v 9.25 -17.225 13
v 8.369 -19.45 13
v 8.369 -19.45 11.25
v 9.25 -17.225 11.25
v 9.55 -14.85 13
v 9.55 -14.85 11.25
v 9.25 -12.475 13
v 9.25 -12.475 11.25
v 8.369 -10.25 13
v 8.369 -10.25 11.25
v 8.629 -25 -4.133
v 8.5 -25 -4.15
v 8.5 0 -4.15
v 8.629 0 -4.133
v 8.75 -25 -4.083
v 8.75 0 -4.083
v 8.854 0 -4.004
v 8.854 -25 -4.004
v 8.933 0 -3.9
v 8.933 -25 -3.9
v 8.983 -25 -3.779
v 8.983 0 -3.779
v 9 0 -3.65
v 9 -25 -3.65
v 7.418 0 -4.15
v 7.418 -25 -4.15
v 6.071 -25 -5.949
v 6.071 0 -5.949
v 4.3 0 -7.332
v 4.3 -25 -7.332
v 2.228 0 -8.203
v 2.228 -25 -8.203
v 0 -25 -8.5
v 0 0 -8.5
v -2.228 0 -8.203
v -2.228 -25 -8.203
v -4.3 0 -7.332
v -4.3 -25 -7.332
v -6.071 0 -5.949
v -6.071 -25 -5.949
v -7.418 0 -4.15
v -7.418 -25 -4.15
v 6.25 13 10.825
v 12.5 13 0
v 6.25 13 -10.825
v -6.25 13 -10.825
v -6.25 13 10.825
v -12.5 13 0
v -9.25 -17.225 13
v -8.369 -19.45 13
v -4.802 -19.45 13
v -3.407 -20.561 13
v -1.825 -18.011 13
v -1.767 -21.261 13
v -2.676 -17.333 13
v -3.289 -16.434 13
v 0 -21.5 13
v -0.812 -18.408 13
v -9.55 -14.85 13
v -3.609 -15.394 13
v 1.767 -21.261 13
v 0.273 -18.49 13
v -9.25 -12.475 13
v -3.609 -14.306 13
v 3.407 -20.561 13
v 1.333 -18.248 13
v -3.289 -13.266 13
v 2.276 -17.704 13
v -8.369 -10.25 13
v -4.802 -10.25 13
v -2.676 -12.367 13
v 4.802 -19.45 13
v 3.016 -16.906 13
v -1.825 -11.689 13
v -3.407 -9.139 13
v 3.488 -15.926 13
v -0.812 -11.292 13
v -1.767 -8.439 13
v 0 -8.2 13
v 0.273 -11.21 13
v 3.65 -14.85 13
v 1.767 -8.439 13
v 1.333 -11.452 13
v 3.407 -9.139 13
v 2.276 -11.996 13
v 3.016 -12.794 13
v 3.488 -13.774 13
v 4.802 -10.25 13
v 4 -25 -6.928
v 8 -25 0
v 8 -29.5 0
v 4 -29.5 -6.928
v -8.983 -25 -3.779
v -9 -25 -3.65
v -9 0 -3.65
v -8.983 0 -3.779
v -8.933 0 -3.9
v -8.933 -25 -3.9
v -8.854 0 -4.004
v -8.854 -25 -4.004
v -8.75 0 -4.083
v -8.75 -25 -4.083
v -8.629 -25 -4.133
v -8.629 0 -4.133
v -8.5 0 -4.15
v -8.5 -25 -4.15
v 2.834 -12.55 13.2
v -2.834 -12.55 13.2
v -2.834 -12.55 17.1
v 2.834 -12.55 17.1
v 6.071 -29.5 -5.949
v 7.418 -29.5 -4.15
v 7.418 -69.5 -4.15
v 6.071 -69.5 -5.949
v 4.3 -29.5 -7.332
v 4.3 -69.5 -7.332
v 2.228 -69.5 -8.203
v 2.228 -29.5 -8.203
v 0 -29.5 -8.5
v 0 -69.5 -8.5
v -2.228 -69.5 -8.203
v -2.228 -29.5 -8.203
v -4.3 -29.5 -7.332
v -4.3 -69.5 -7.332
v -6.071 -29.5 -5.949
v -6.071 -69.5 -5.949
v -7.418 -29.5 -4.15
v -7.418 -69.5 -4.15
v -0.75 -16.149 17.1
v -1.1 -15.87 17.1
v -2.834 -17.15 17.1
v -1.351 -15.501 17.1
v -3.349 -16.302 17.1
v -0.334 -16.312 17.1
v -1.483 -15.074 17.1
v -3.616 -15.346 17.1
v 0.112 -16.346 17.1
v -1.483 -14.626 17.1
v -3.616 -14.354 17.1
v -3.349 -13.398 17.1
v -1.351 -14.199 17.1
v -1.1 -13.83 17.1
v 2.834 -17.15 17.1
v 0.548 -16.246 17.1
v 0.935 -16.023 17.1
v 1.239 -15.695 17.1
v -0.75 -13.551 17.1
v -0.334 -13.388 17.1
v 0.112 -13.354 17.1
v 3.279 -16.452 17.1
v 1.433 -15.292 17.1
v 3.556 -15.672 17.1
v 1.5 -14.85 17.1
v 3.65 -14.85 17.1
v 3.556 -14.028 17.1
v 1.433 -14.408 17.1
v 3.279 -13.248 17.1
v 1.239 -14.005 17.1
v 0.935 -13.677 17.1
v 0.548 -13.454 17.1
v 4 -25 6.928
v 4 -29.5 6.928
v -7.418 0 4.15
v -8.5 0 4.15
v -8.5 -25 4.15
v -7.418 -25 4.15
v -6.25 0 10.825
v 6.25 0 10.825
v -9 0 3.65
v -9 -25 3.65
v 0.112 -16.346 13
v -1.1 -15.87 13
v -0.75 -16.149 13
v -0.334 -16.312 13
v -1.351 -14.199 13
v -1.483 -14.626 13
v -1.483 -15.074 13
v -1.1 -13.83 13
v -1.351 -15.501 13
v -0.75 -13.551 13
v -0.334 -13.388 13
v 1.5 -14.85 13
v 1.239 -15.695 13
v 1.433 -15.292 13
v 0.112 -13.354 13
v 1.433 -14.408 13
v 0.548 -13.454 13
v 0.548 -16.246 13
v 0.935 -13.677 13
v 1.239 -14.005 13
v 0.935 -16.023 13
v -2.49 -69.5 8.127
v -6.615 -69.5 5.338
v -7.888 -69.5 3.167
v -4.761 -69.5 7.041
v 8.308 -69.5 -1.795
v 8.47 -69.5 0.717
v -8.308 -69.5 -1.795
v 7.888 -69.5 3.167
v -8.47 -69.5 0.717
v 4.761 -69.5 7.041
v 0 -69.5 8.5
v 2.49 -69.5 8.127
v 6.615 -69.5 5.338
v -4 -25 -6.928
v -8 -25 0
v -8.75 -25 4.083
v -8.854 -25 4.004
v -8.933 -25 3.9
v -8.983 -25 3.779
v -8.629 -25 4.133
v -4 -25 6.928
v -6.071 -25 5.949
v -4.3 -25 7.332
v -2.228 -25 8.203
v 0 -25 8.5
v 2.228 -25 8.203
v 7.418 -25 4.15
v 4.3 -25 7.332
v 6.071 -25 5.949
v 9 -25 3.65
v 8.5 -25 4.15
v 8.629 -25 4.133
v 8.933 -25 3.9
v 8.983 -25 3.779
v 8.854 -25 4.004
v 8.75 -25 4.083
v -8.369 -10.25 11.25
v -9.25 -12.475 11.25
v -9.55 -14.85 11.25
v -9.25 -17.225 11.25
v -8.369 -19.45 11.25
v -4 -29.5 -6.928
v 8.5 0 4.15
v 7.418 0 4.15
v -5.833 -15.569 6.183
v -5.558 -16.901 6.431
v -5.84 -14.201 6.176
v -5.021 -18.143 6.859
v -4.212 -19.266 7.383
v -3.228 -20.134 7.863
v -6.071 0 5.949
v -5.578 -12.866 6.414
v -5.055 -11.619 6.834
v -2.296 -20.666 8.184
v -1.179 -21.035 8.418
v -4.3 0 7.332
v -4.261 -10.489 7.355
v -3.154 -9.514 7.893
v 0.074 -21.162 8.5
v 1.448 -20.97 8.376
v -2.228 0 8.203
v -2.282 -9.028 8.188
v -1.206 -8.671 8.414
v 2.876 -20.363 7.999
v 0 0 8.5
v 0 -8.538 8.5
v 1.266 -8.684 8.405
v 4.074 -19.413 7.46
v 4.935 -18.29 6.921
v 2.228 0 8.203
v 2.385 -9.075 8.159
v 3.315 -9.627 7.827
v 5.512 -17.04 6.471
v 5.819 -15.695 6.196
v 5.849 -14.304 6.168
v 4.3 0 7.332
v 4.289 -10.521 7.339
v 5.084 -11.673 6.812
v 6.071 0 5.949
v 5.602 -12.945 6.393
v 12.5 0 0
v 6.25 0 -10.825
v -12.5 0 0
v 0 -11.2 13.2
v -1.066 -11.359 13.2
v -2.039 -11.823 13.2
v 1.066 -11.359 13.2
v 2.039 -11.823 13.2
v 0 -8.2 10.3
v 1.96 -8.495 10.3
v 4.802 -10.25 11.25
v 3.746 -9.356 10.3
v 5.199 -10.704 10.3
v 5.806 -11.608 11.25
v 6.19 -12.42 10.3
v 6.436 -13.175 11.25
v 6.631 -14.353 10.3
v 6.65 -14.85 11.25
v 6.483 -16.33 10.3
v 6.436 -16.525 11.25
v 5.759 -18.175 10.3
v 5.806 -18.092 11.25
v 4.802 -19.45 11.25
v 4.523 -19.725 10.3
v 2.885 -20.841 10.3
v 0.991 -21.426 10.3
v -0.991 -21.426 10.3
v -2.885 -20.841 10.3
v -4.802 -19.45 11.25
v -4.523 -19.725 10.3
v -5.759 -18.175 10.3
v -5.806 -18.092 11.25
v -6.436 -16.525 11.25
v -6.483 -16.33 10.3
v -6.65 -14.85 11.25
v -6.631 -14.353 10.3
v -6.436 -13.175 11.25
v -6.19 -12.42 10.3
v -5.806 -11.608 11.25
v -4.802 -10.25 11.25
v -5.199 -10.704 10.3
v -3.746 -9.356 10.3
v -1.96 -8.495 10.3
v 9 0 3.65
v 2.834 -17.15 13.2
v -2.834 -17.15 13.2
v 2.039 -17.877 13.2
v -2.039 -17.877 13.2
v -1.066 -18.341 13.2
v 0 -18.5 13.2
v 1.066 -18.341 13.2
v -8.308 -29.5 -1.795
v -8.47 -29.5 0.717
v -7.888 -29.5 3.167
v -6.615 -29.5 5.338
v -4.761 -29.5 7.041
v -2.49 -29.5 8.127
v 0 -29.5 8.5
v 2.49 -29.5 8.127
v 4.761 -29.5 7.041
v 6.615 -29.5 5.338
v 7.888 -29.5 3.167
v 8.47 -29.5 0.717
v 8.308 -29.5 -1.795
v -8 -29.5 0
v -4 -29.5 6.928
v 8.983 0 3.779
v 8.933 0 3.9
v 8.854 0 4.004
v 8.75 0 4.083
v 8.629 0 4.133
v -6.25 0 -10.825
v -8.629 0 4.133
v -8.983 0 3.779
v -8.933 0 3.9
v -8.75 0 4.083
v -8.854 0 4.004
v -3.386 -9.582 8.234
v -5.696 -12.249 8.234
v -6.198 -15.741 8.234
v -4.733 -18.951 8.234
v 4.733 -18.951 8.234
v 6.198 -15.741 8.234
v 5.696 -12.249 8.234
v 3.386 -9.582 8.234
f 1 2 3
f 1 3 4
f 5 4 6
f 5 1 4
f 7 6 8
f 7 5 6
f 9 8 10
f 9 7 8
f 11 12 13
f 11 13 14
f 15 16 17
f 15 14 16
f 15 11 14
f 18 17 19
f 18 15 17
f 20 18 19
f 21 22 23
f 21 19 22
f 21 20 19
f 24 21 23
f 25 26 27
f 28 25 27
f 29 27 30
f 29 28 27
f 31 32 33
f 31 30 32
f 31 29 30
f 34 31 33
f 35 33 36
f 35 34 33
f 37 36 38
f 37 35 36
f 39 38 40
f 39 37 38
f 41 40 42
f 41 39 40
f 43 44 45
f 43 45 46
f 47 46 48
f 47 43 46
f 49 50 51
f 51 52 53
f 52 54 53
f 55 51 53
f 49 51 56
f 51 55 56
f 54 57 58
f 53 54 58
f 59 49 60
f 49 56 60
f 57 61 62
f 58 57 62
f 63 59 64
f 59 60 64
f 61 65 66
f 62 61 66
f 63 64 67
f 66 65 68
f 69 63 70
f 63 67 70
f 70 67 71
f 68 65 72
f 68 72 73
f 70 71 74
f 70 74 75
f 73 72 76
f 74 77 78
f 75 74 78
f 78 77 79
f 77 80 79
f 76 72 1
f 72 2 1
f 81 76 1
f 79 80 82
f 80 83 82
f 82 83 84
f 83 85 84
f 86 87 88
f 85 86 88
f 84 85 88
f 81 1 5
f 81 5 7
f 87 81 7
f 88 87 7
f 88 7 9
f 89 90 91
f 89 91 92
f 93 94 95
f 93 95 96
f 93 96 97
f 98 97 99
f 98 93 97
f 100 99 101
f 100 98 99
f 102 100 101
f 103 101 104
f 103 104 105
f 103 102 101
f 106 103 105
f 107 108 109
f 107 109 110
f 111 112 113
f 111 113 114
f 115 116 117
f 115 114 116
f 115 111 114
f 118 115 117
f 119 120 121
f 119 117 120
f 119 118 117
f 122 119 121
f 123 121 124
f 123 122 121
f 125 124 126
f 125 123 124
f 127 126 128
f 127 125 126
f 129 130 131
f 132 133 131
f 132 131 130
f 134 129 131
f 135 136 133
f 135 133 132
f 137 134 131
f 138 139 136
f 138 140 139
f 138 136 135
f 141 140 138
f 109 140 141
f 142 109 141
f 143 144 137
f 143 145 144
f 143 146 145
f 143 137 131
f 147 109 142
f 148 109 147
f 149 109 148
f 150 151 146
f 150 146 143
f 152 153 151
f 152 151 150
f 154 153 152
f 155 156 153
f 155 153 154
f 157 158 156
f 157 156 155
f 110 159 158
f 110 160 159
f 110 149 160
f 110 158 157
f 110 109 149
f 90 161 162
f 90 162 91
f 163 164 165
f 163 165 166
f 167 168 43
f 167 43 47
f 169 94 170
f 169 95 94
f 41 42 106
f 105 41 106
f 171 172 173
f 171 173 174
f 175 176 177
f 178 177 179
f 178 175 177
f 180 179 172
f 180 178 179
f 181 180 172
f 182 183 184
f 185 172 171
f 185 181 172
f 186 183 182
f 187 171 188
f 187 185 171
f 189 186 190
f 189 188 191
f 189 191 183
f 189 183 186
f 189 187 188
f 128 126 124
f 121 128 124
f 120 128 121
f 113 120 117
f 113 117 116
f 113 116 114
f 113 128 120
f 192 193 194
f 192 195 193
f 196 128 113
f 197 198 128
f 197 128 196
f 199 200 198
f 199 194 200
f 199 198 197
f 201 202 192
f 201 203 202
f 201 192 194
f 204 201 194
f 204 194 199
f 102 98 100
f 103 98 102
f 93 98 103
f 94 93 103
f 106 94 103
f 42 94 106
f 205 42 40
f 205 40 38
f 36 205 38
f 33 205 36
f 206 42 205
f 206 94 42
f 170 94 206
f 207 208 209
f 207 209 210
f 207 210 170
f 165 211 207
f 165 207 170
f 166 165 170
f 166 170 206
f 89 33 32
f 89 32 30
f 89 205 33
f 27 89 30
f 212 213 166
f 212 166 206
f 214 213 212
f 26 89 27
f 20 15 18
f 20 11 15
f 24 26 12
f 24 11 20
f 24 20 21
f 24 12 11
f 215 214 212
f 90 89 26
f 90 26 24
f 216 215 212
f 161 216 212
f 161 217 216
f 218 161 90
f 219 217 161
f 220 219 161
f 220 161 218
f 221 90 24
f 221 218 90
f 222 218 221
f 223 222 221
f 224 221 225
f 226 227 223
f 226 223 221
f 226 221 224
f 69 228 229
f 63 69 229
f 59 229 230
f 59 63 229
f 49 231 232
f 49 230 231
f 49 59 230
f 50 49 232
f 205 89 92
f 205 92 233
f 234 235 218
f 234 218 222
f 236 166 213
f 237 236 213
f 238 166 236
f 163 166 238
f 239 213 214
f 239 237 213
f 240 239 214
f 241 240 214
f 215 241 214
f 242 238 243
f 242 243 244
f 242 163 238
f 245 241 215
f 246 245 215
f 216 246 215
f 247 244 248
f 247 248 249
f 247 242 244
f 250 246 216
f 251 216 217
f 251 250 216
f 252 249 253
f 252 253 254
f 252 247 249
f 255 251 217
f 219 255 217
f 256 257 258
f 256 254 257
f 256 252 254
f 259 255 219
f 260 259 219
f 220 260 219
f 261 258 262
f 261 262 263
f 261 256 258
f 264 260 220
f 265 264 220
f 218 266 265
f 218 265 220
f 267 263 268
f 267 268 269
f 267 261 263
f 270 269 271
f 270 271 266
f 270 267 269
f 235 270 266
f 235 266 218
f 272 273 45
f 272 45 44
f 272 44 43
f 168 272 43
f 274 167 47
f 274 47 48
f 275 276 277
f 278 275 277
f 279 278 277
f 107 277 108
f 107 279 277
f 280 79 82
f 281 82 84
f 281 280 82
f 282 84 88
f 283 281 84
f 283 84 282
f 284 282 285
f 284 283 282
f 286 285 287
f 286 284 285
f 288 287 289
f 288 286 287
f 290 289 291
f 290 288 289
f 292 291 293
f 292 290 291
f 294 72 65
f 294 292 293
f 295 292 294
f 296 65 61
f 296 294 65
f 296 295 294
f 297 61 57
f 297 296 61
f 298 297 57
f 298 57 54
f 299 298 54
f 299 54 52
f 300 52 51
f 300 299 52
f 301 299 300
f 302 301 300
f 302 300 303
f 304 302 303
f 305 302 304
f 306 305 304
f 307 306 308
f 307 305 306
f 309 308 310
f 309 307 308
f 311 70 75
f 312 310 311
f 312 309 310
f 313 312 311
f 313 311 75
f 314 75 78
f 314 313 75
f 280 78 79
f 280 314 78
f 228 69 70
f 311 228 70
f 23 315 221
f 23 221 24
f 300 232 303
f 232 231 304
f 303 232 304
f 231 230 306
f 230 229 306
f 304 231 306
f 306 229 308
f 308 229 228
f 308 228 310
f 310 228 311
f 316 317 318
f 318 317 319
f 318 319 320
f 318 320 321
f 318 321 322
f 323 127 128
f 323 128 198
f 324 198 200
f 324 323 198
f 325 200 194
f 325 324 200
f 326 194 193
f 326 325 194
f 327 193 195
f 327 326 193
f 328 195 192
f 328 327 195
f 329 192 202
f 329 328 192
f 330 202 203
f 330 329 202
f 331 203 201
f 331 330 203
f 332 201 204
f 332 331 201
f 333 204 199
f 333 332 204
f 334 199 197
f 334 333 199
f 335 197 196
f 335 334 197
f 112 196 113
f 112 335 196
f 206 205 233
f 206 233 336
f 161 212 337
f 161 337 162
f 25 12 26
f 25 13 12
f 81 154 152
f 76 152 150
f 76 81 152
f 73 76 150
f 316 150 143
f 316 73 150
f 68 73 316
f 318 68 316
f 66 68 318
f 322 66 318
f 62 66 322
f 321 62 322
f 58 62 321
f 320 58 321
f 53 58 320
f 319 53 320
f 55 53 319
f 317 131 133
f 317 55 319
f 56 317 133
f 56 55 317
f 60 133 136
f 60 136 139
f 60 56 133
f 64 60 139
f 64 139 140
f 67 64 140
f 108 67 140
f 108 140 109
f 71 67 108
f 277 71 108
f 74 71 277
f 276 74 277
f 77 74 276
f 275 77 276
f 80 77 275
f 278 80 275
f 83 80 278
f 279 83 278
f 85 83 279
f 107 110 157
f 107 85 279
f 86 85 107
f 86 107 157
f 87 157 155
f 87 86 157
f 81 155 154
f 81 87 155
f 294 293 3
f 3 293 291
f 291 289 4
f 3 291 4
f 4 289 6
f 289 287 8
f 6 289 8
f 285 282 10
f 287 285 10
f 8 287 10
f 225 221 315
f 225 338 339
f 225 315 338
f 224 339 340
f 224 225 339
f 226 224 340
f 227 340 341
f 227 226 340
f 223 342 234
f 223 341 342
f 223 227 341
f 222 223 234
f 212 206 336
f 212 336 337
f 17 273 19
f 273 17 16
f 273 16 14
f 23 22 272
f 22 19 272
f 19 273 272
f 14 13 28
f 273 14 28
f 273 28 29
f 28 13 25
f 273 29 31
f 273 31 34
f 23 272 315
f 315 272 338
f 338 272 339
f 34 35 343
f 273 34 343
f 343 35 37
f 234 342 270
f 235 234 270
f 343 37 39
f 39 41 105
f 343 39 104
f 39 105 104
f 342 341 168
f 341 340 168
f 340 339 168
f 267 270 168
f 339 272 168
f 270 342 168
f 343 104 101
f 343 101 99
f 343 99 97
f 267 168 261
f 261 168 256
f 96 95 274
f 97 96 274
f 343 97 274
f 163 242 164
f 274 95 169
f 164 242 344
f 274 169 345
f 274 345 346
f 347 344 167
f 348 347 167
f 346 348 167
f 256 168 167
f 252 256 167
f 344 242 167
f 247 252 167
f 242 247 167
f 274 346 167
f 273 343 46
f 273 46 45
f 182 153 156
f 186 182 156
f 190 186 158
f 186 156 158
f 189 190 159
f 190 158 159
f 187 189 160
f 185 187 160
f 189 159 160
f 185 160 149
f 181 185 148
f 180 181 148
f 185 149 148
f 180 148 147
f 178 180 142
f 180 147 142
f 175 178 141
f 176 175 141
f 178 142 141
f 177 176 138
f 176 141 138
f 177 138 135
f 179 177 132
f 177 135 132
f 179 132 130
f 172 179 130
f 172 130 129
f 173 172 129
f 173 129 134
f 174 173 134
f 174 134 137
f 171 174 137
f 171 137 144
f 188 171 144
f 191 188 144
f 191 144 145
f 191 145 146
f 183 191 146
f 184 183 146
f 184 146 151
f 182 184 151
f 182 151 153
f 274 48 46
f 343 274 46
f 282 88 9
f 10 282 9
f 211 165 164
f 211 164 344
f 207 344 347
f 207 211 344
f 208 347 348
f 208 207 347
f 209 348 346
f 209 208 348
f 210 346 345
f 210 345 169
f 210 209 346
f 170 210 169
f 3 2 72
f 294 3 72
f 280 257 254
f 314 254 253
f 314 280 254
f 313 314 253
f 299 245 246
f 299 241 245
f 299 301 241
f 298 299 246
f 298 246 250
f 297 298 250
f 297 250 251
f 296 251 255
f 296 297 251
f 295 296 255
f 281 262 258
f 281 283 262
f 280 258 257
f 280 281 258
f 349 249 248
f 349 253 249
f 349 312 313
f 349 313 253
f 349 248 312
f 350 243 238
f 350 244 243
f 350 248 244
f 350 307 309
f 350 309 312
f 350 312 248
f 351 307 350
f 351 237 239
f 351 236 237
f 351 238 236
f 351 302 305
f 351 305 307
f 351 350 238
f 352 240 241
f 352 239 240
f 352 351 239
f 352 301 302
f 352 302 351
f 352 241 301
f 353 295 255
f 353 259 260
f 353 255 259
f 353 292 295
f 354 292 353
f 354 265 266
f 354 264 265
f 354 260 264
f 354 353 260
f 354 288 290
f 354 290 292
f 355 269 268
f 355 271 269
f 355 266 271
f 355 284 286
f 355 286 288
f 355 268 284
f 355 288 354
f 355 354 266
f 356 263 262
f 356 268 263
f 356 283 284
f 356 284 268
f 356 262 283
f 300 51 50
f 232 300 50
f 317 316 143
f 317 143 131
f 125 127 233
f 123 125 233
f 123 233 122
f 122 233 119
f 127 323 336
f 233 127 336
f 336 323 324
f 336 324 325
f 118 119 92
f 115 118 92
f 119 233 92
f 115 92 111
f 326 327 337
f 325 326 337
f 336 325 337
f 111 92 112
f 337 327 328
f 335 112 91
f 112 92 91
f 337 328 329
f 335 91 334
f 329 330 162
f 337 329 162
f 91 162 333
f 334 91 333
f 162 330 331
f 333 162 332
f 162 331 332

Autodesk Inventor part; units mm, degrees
ref_plane "YZ Plane" through (0, 0, 0) normal (1, 0, 0) x (0, 1, 0)
ref_plane "XZ Plane" through (0, 0, 0) normal (0, 1, 0) x (-1, 0, 0)
ref_plane "XY Plane" through (0, 0, 0) normal (0, 0, 1) x (1, 0, 0)
sketch "스케치1" plane through (0, 0, 0) normal (0, 1, 0) x (-1, 0, 0)
  line L0 (12.5, 0) -> (6.25, -10.8253)
  line L1 (6.25, -10.8253) -> (-6.25, -10.8253)
  line L2 (-6.25, -10.8253) -> (-12.5, 0)
  line L3 (-12.5, 0) -> (-6.25, 10.8253)
  line L4 (-6.25, 10.8253) -> (6.25, 10.8253)
  line L5 (6.25, 10.8253) -> (12.5, 0)
  point P0 (0, 0)
  point P1 (0, 0)
  dimension "d0" = 25
extrude "돌출1" add sketch "스케치1" along normal blind 13
sketch "스케치2" plane through (0, 0, 0) normal (0, -1, 0) x (1, 0, 0)
  circle A0 centre (0, 0) radius 8.5
  line L0 (-9, 4.15) -> (9, 4.15)
  line L1 (9, 4.15) -> (9, -4.15)
  line L2 (9, -4.15) -> (-9, -4.15)
  line L3 (-9, -4.15) -> (-9, 4.15)
  line L4 (-9, 4.15) -> (9, -4.15) construction
  line L5 (9, 4.15) -> (-9, -4.15) construction
  point P0 (7.4181, -4.15)
  point P1 (7.4181, 4.15)
  point P2 (-7.4181, -4.15)
  point P3 (-7.4181, 4.15)
  dimension "d3" = 17
  dimension "d4" = 18
  dimension "d5" = 8.3
extrude "돌출2" add sketch "스케치2" along normal blind 25
sketch "스케치3" plane through (0, -25, 0) normal (0, -1, 0) x (1, 0, 0)
  line L0 (8, 0) -> (4, -6.9282)
  line L1 (4, -6.9282) -> (-4, -6.9282)
  line L2 (-4, -6.9282) -> (-8, 0)
  line L3 (-8, 0) -> (-4, 6.9282)
  line L4 (-4, 6.9282) -> (4, 6.9282)
  line L5 (4, 6.9282) -> (8, 0)
  point P0 (0, 0)
  point P1 (0, 0)
  dimension "d8" = 16
extrude "돌출3" add sketch "스케치3" along normal blind 4.5
sketch "스케치4" plane through (0, -29.5, 0) normal (0, -1, 0) x (1, 0, 0)
  arc A0 (-7.4181, -4.15) -> (7.4181, -4.15) centre (0, 0) ccw projected
  circle A1 centre (0, 0) radius 8.5
  point P0 (7.4181, -4.15)
  dimension "d11" = 17
extrude "돌출4" add sketch "스케치4" along normal blind 40
fillet "모깎기1" radius 0.5 4 edges at (-9, -12.5, 4.15) (9, -12.5, 4.15) (9, -12.5, -4.15) (-9, -12.5, -4.15)
sketch "스케치5" plane through (0, 0, 0) normal (1, 0, 0) x (0, 1, 0)
  line L0 (-8.2, 4) -> (-21.5, 4)
  line L1 (-21.5, 4) -> (-21.5, 13)
  line L2 (-21.5, 13) -> (-8.2, 13)
  line L3 (-8.2, 13) -> (-8.2, 4)
  line L4 (0, 8.5) -> (-25, 8.5) construction
  line L5 (-8.2, 4) -> (-21.5, 13) construction
  line L6 (-21.5, 4) -> (-8.2, 13) construction
  line L7 (-25, 8.5) -> (-25, 4.15) projected
  line L8 (-12.35, 13) -> (-17.35, 13)
  line L9 (-17.35, 13) -> (-17.35, 4)
  line L10 (-17.35, 4) -> (-12.35, 4)
  line L11 (-12.35, 4) -> (-12.35, 13)
  line L12 (-12.35, 13) -> (-17.35, 4) construction
  line L13 (-17.35, 13) -> (-12.35, 4) construction
  line L14 (-14.85, 13) -> (-14.85, 4)
  line L15 (-8.2, 4) -> (-14.5, 4)
  line L16 (-14.5, 4) -> (-14.5, 4.9729)
  line L17 (-14.5, 4.9729) -> (-8.2, 4.9729)
  line L18 (-8.2, 4.9729) -> (-8.2, 4)
  line L19 (-12.35, 4) -> (-12.35, 4.9729)
  line L20 (-14.5, 4.9729) -> (-17.35, 4.9729)
  line L21 (-17.35, 4.9729) -> (-17.35, 4)
  line L22 (-8.2, 13) -> (-8.2, 10.3)
  line L23 (-8.2, 10.3) -> (-9.2, 4.9729)
  point P0 (0, 0)
  point P1 (-14.85, 8.5)
  point P2 (-14.5, 7.2)
  point P3 (-14.85, 4.9729)
  point P4 (-12.35, 4.9729)
  dimension "d15" = 13.3
  dimension "d17" = 9
  dimension "d18" = 5
  dimension "d31" = 3.5
  dimension "d32" = 2.7
  dimension "d33" = 1
revolve "회전1" add sketch "스케치5" angle 360 about axis through (0, -14.85, 13) along (0, 0, -1) contours L0 L16 L17 L11 | L17 L20 L14 L2 L11 | L11 L2 L3 L23 L17
sketch "스케치8" plane through (0, -14.85, 13) normal (0, 0, 1) x (1, 0, 0)
  circle A0 centre (0, 0) radius 9.55
  line L0 (-9.55, 4.6) -> (9.55, 4.6)
  line L1 (9.55, 4.6) -> (9.55, -4.6)
  line L2 (9.55, -4.6) -> (-9.55, -4.6)
  line L3 (-9.55, -4.6) -> (-9.55, 4.6)
  line L4 (-9.55, 4.6) -> (9.55, -4.6) construction
  line L5 (9.55, 4.6) -> (-9.55, -4.6) construction
  circle A1 centre (0, 0) radius 6.65 projected
  point P0 (0, 14.85)
  point P1 (-4.8023, 4.6)
  point P2 (-8.3691, 4.6)
  point P3 (-8.3691, -4.6)
  point P4 (-4.8023, -4.6)
  point P5 (4.8023, -4.6)
  point P6 (8.3691, -4.6)
  point P7 (8.3691, 4.6)
  point P8 (4.8023, 4.6)
  dimension "d34" = 19.1
  dimension "d35" = 9.2
extrude "돌출7" add sketch "스케치8" against normal blind 1.75 contours A0 L2 A1 L0 | L0 A1 L2 A0 | A1 L2 L0 | L0 A1 | A1 L2
sketch "스케치9" plane through (-8.3691, -10.25, 13) normal (0, 0, 1) x (1, 0, 0)
  arc A0 (13.1715, 0) -> (3.5668, 0) centre (8.3691, -4.6) ccw projected
  circle A1 centre (8.3691, -4.6) radius 3.65
  line L0 (4.7191, -2.3) -> (12.0191, -2.3)
  line L1 (12.0191, -2.3) -> (12.0191, -6.9)
  line L2 (12.0191, -6.9) -> (4.7191, -6.9)
  line L3 (4.7191, -6.9) -> (4.7191, -2.3)
  line L4 (4.7191, -2.3) -> (12.0191, -6.9) construction
  line L5 (12.0191, -2.3) -> (4.7191, -6.9) construction
  point P0 (8.3691, 10.25)
  point P1 (5.535, -6.9)
  point P2 (11.2033, -6.9)
  point P3 (11.2033, -2.3)
  point P4 (5.535, -2.3)
  dimension "d38" = 7.3
  dimension "d39" = 4.6
extrude "돌출8" add sketch "스케치9" along normal blind 0.2 contours A1 L2 L0 | L0 A1 | A1 L2
extrude "돌출9" add sketch "스케치9" along normal blind 4.1 contours A1 L2 L0
sketch "스케치10" plane through (-8.3691, -10.25, 17.1) normal (0, 0, 1) x (1, 0, 0)
  arc A0 (11.2033, -6.9) -> (11.2033, -2.3) centre (8.3691, -4.6) ccw projected
  circle A1 centre (8.3691, -4.6) radius 1.5
  point P0 (8.3691, 10.25)
  dimension "d44" = 3
extrude "돌출10" cut sketch "스케치10" against normal blind 4.1
sketch "스케치11" plane through (9, 0, 3.65) normal (1, 0, 0) x (0, 0, -1)
  point P0 (3.65, 0)
properties part number "가스벨브 역설계"
